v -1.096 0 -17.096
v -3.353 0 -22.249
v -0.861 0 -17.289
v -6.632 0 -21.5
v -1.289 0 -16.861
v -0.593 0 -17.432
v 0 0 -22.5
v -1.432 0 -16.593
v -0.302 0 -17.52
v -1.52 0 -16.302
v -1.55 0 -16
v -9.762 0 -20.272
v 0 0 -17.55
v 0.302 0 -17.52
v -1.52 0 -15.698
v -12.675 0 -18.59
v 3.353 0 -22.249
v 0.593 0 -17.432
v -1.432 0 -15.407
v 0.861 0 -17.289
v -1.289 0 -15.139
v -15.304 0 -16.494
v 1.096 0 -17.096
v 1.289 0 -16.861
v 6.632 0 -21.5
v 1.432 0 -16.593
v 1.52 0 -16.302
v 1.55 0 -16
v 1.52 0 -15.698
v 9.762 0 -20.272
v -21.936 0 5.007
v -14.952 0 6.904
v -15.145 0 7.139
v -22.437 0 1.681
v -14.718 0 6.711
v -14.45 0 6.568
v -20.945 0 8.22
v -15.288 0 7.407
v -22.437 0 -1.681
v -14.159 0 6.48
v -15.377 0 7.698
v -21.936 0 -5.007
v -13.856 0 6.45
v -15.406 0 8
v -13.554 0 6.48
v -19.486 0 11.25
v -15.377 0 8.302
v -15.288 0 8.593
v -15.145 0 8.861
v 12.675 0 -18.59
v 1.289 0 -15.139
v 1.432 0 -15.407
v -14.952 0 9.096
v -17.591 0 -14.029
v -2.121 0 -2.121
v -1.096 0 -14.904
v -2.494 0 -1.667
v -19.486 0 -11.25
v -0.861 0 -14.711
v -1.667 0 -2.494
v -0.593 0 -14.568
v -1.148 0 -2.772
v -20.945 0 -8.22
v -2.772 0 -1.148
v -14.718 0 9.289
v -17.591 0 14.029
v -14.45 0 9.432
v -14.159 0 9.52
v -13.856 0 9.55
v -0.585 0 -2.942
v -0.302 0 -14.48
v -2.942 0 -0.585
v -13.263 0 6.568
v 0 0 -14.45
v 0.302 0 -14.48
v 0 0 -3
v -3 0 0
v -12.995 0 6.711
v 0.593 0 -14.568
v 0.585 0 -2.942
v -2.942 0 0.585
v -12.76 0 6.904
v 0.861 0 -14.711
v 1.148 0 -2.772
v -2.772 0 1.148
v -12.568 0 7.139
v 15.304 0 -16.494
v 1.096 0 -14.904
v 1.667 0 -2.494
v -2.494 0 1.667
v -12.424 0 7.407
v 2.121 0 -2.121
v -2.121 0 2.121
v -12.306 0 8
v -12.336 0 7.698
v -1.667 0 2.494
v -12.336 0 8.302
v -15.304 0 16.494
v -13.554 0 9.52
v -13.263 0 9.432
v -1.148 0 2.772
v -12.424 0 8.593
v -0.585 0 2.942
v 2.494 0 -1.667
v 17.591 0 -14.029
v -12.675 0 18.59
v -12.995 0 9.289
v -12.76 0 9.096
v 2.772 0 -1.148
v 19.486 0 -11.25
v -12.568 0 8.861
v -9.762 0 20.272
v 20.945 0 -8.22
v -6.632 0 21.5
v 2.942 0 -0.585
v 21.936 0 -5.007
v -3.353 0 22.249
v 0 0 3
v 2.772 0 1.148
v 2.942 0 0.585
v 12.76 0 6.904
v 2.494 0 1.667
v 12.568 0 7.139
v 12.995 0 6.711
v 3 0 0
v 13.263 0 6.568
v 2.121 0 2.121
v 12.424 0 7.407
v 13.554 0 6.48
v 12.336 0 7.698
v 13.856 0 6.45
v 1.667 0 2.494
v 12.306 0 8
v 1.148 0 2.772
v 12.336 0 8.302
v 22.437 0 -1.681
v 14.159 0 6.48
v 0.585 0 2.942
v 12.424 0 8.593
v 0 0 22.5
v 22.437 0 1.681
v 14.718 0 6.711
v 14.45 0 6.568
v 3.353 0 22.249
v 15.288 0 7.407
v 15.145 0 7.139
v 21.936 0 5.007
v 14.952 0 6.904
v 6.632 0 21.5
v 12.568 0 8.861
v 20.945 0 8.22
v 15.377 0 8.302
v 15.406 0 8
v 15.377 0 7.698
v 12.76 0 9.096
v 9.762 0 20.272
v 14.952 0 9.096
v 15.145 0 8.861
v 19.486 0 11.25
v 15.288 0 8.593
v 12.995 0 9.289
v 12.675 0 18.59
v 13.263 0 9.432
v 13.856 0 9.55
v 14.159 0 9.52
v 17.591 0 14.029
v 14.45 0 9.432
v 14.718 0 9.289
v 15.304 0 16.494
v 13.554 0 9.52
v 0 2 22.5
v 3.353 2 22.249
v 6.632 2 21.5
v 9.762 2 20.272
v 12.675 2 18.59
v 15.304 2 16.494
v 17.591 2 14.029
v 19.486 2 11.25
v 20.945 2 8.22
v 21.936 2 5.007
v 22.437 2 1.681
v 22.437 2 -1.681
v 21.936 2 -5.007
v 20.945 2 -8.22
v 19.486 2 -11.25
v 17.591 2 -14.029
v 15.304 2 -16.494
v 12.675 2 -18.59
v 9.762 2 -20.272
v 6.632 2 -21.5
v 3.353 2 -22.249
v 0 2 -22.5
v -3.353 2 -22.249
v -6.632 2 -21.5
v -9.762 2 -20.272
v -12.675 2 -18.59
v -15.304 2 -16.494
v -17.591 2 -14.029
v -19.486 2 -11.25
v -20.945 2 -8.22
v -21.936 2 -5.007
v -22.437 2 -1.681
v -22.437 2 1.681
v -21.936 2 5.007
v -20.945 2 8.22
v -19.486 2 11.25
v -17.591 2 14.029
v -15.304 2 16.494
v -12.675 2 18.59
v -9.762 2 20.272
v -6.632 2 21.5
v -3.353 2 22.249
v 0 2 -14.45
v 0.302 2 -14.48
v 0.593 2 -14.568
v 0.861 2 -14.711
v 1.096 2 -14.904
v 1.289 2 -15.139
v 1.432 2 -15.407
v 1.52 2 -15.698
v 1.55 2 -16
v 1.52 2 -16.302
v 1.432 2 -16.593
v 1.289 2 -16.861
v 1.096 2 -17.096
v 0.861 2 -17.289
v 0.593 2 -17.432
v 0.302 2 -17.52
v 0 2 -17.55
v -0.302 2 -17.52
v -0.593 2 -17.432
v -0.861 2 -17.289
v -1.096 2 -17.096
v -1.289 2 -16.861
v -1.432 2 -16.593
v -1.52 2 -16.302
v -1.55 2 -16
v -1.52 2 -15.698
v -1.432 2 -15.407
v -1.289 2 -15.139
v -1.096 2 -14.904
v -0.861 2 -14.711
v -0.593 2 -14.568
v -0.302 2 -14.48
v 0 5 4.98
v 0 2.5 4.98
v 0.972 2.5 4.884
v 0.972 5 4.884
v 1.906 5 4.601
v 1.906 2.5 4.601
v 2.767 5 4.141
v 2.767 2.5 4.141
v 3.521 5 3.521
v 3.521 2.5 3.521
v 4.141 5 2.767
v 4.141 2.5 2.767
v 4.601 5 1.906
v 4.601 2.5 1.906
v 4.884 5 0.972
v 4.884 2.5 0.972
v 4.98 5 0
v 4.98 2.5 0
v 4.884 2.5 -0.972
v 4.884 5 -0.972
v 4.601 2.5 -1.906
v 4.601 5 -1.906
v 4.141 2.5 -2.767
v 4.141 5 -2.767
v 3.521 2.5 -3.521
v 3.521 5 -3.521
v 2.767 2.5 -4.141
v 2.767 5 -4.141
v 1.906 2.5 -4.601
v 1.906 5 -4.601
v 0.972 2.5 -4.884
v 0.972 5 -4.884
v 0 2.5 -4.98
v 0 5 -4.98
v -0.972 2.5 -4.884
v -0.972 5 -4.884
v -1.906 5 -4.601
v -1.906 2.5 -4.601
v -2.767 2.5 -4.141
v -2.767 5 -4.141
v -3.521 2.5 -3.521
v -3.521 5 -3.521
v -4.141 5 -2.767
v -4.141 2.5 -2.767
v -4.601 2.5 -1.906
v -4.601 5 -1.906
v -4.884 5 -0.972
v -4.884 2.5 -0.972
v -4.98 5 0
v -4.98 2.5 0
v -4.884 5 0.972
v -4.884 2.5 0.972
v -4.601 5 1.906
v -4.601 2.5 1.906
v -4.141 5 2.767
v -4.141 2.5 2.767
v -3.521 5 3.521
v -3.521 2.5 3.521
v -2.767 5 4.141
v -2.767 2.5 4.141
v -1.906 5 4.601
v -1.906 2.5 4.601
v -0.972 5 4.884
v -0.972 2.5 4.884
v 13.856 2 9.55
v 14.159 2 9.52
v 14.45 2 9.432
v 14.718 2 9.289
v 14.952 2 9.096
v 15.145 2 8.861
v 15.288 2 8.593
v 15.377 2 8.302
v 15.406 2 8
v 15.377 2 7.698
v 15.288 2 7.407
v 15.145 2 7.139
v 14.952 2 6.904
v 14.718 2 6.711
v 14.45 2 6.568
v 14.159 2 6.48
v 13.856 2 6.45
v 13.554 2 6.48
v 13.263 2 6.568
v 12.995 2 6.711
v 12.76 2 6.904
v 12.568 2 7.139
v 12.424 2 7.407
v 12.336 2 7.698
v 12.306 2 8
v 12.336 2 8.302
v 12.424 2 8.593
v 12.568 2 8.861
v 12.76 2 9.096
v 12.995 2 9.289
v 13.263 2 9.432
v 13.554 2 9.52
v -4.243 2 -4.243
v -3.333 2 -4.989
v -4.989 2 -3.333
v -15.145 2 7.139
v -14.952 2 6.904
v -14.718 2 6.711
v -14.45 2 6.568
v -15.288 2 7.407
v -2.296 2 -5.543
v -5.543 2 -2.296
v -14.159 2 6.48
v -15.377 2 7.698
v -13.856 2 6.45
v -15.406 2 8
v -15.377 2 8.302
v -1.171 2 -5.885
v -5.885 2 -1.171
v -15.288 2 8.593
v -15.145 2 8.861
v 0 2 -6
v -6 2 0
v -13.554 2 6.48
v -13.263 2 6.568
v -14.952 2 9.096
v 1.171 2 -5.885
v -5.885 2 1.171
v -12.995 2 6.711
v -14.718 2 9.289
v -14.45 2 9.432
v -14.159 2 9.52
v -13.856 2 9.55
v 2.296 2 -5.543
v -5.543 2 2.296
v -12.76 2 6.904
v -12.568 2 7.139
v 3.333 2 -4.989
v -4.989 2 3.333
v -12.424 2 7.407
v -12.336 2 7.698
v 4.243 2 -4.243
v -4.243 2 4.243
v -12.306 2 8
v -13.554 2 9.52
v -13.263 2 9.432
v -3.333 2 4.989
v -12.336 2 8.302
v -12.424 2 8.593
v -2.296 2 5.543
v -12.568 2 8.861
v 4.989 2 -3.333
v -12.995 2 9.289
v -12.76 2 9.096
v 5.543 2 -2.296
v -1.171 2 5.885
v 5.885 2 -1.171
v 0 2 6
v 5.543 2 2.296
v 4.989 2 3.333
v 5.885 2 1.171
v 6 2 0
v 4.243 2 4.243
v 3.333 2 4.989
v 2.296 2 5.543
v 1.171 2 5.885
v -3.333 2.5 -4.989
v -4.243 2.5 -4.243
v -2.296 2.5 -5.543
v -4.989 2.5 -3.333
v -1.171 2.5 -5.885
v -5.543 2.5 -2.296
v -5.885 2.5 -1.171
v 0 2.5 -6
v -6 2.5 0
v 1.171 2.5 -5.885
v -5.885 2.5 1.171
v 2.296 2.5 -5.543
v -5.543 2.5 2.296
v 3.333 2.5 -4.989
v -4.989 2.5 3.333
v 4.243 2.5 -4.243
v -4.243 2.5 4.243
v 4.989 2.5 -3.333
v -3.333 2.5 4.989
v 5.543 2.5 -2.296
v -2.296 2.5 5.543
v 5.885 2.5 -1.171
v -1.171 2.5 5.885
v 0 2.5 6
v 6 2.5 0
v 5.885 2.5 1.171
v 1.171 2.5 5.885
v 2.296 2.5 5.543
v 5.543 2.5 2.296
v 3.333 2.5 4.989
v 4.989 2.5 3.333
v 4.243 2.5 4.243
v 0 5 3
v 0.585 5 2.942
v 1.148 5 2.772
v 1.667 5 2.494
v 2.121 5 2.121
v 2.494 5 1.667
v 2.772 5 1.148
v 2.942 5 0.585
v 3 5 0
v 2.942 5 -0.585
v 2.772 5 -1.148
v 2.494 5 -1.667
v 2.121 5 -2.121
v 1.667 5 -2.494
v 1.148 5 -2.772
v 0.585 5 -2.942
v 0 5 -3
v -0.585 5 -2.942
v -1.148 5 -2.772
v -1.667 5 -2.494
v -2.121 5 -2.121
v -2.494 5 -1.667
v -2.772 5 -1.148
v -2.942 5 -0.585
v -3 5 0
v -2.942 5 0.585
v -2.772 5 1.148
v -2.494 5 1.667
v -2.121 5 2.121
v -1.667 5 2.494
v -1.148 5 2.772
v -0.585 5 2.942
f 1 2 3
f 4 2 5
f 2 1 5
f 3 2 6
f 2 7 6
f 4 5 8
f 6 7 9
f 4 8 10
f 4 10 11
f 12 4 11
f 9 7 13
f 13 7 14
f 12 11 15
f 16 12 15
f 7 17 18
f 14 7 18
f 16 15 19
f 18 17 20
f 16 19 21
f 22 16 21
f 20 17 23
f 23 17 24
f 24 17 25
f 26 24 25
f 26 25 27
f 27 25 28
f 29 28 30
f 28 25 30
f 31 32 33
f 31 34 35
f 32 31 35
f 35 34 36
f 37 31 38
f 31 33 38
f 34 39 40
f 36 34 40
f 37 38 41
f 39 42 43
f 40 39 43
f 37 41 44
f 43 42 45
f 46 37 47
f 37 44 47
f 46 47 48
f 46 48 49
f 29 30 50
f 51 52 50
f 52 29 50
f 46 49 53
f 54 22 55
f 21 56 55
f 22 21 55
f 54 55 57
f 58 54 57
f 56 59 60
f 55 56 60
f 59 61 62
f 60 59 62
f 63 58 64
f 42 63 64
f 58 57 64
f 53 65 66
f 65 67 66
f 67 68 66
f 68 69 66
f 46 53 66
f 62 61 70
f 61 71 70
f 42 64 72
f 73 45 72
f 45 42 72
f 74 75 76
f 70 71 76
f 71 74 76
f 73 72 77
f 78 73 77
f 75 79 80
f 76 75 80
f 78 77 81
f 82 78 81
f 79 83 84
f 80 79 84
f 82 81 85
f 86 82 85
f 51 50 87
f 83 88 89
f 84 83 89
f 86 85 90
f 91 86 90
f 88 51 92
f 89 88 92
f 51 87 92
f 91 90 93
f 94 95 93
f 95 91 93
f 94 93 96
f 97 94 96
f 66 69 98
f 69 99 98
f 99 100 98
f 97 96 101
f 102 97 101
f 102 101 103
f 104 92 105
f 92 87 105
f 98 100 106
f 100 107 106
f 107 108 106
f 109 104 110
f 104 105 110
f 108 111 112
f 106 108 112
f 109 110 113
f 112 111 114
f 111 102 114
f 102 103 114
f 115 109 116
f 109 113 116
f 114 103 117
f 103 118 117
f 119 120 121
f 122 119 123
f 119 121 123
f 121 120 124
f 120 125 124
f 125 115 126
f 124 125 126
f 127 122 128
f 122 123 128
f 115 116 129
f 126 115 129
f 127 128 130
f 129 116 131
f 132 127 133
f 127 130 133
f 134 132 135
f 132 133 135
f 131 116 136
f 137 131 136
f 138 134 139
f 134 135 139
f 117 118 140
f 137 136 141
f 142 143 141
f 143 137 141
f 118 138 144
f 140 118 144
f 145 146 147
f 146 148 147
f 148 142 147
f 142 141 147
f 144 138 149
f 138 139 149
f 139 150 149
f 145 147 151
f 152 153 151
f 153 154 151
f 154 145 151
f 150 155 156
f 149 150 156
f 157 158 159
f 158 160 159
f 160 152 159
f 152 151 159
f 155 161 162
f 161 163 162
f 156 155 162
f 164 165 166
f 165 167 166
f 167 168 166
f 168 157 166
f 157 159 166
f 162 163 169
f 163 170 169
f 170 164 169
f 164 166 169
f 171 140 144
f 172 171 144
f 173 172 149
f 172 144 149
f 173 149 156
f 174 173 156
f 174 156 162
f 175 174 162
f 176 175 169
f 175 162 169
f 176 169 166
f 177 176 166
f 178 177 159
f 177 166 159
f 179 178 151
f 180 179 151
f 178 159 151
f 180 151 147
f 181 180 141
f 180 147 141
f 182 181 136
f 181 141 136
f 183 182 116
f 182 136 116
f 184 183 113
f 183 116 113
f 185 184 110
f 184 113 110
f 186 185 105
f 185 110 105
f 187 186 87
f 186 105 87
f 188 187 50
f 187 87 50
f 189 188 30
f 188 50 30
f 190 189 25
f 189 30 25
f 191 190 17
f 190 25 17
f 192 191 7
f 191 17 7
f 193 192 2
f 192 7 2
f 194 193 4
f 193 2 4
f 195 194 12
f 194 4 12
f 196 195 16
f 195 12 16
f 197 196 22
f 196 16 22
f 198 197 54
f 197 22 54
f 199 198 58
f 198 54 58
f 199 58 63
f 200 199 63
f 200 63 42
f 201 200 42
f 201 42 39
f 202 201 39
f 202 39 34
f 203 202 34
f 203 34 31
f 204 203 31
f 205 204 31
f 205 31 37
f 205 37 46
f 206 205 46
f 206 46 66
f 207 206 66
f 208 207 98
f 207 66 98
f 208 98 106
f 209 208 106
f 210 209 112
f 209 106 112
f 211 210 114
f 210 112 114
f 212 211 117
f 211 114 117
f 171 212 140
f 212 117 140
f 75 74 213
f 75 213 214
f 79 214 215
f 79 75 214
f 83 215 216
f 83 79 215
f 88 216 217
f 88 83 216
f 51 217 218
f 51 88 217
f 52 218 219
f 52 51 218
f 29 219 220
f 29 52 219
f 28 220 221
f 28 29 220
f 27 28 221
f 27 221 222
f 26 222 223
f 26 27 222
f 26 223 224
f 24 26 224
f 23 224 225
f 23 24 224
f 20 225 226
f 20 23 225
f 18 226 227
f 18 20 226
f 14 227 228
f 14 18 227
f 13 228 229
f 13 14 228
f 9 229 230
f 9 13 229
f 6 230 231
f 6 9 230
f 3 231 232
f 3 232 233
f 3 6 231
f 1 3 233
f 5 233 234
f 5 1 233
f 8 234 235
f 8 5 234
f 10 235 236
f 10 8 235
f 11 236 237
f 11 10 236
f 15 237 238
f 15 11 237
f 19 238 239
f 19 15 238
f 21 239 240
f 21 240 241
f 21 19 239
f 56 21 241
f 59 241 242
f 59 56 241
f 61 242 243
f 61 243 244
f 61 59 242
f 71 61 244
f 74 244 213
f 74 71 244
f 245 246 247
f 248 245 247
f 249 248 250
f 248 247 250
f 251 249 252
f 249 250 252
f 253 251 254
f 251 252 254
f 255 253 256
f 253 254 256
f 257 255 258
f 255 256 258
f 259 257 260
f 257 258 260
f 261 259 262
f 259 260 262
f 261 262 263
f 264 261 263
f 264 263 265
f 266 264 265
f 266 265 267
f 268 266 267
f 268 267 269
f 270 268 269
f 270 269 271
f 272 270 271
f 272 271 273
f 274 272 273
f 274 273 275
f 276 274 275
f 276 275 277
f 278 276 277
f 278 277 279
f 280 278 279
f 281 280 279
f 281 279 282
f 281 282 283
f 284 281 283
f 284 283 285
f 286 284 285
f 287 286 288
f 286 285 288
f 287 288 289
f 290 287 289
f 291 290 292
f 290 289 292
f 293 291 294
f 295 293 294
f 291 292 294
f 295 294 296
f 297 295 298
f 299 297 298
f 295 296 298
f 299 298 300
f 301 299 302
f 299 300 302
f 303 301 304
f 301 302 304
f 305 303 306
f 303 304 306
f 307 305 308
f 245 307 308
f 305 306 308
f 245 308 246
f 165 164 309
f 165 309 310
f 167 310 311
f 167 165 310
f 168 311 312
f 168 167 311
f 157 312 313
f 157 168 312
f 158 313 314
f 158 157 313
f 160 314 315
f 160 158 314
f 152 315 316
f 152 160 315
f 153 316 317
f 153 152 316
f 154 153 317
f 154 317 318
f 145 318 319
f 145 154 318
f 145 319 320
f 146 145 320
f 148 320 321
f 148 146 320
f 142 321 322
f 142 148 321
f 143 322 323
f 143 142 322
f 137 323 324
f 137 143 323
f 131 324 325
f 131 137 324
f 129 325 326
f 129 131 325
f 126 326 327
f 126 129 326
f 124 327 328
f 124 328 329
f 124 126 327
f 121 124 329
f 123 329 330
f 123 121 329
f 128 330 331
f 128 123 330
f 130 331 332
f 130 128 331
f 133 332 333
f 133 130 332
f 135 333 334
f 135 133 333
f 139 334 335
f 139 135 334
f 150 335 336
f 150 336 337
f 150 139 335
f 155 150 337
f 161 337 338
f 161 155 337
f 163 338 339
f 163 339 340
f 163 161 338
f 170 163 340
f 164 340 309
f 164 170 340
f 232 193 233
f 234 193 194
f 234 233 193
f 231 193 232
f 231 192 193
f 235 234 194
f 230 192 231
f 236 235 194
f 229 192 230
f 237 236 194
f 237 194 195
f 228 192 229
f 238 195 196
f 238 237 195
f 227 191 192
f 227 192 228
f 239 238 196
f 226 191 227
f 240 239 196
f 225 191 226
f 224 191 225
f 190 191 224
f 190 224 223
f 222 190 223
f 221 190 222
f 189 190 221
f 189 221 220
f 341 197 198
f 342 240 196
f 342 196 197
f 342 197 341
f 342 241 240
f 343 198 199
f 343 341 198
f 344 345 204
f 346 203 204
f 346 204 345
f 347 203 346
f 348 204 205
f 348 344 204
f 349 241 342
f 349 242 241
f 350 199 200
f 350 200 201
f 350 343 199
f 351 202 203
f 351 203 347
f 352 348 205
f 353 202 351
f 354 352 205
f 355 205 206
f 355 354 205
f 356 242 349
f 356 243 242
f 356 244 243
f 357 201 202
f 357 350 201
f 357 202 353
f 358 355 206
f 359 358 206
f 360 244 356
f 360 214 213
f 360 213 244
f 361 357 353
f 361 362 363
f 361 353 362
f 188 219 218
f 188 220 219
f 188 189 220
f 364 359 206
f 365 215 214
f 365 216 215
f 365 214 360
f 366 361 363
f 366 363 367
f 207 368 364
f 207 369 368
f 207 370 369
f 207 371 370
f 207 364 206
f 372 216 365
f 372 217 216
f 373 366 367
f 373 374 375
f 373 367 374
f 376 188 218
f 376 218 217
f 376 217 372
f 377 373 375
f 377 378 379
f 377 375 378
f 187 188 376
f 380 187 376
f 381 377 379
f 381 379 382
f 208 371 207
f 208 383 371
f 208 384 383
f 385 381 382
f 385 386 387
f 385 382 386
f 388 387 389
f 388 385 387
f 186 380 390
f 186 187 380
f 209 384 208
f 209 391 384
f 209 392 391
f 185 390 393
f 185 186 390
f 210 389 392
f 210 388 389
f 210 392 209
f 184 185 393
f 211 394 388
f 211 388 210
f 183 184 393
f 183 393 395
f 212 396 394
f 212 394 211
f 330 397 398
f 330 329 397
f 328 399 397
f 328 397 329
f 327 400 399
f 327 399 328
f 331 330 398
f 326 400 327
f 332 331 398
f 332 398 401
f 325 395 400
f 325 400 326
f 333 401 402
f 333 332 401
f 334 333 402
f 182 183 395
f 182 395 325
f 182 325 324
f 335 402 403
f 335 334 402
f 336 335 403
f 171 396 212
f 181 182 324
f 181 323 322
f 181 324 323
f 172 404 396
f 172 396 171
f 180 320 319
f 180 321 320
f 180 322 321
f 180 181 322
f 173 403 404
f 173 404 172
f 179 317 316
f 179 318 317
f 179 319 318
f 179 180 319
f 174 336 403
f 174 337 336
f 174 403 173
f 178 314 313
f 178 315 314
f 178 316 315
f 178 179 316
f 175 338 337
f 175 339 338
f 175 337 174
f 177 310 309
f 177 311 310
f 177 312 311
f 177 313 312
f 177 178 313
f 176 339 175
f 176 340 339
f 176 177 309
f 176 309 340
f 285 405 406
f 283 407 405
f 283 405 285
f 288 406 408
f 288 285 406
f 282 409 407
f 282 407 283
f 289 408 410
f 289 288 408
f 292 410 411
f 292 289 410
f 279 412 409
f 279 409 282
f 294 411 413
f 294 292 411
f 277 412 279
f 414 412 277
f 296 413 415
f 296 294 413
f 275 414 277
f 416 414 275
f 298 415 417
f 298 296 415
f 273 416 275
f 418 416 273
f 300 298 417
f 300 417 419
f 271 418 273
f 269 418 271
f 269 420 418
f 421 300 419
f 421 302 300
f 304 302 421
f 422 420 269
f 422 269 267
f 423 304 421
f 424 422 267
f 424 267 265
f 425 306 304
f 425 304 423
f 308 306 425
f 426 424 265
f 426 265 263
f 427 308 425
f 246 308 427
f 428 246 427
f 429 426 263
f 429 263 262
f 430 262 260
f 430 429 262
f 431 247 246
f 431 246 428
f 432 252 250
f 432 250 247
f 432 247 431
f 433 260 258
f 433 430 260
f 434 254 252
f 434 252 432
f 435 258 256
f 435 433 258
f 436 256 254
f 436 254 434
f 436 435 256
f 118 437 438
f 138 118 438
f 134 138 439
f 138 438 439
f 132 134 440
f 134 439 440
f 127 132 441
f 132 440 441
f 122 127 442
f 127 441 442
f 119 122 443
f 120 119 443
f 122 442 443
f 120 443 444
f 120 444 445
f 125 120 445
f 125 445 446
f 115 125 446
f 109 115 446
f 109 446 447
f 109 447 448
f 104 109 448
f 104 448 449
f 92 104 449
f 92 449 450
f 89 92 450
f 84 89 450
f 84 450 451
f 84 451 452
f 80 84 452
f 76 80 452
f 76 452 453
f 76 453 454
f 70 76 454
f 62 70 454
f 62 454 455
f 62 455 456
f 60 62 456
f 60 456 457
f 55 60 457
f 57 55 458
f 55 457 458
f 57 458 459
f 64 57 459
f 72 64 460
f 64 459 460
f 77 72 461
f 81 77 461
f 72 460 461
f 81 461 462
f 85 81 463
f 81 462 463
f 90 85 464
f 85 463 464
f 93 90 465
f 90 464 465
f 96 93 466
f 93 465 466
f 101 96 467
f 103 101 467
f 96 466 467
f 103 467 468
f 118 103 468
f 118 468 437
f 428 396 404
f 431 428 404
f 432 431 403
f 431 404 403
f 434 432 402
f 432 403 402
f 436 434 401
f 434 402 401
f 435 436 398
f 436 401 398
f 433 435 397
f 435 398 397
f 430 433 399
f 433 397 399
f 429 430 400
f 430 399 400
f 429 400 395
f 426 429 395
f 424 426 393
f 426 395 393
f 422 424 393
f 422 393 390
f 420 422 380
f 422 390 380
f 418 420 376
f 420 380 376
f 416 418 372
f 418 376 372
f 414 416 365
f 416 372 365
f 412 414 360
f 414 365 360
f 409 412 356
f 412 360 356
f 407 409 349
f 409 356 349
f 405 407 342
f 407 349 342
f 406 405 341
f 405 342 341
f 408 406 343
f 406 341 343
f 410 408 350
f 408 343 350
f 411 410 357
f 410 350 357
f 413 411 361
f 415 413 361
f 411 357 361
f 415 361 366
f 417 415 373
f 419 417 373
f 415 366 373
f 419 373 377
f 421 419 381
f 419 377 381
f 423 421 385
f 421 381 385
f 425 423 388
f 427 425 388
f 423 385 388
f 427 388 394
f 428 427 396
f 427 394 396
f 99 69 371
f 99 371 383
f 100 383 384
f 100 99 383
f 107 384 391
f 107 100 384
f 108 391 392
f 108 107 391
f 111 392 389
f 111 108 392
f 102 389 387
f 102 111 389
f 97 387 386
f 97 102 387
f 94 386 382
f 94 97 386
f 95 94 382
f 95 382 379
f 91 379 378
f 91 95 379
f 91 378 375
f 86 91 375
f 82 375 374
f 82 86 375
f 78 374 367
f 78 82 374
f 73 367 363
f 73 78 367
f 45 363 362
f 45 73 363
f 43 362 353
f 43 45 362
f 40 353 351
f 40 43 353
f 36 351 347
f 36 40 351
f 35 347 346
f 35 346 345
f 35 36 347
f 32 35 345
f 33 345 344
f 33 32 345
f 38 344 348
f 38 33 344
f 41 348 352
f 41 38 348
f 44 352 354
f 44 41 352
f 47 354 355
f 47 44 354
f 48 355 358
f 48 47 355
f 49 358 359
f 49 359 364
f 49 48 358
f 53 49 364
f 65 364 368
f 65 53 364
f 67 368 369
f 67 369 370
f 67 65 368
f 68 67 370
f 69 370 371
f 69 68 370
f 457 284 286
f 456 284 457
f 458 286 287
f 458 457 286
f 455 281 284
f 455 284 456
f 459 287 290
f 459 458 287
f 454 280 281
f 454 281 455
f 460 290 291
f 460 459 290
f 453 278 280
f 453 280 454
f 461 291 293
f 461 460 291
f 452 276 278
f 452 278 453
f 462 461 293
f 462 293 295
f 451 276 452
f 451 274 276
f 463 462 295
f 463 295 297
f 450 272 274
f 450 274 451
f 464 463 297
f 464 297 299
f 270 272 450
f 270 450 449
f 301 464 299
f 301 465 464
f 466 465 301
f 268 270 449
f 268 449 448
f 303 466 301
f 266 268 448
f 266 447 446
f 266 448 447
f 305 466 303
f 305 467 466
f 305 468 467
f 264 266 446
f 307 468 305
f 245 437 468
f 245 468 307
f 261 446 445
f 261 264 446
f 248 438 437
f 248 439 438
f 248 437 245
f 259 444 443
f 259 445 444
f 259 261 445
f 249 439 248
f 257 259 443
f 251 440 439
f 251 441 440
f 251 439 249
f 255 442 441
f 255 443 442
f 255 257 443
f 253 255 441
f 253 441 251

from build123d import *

# Parameters (mm, degrees)
SKETCH_1_R          = 22.5
SKETCH_1_R_2        = 1.55
EXTRUDE_1_DEPTH     = 2
SKETCH_2_R          = 4.98
EXTRUDE_2_DEPTH     = 3
SKETCH_3_R          = 6
EXTRUDE_3_DEPTH     = 0.5
SKETCH_4_R          = 3
CUT_EXTRUDE_1_DEPTH = 33.210246817


with BuildPart() as part:
    # ｽｹｯﾁ1 → ﾎﾞｽ - 押し出し1 (new body)
    with BuildSketch(Plane(origin=(0, 0, 0), x_dir=(1, 0, 0), z_dir=(0, 1, 0))):
        with Locations(Location((0, 0, 0), (0, 0, 270))):
            Circle(SKETCH_1_R)
        with Locations(Location((0, 16, 0), (0, 0, 270))):
            Circle(SKETCH_1_R_2, mode=Mode.SUBTRACT)
        with Locations(Location((13.856406461, -8, 0), (0, 0, 270))):
            Circle(SKETCH_1_R_2, mode=Mode.SUBTRACT)
        with Locations(Location((-13.856406461, -8, 0), (0, 0, 270))):
            Circle(SKETCH_1_R_2, mode=Mode.SUBTRACT)
    extrude(amount=EXTRUDE_1_DEPTH)

    # ｽｹｯﾁ2 → ﾎﾞｽ - 押し出し2 (add)
    with BuildSketch(Plane(origin=(0, 2, 0), x_dir=(1, 0, 0), z_dir=(0, 1, 0))):
        with Locations(Location((0, 0, 0), (0, 0, 270))):
            Circle(SKETCH_2_R)
    extrude(amount=EXTRUDE_2_DEPTH)

    # ｽｹｯﾁ3 → ﾎﾞｽ - 押し出し3 (add)
    with BuildSketch(Plane(origin=(0, 2, 0), x_dir=(1, 0, 0), z_dir=(0, 1, 0))):
        with Locations(Location((0, 0, 0), (0, 0, 270))):
            Circle(SKETCH_3_R)
    extrude(amount=EXTRUDE_3_DEPTH)

    # ｽｹｯﾁ4 → ｶｯﾄ - 押し出し1 (cut, through all)
    with BuildSketch(Plane(origin=(0, 5, 0), x_dir=(1, 0, 0), z_dir=(0, 1, 0))):
        with Locations(Location((0, 0, 0), (0, 0, 270))):
            Circle(SKETCH_4_R)
    extrude(amount=-CUT_EXTRUDE_1_DEPTH, mode=Mode.SUBTRACT)


solid = part.part
